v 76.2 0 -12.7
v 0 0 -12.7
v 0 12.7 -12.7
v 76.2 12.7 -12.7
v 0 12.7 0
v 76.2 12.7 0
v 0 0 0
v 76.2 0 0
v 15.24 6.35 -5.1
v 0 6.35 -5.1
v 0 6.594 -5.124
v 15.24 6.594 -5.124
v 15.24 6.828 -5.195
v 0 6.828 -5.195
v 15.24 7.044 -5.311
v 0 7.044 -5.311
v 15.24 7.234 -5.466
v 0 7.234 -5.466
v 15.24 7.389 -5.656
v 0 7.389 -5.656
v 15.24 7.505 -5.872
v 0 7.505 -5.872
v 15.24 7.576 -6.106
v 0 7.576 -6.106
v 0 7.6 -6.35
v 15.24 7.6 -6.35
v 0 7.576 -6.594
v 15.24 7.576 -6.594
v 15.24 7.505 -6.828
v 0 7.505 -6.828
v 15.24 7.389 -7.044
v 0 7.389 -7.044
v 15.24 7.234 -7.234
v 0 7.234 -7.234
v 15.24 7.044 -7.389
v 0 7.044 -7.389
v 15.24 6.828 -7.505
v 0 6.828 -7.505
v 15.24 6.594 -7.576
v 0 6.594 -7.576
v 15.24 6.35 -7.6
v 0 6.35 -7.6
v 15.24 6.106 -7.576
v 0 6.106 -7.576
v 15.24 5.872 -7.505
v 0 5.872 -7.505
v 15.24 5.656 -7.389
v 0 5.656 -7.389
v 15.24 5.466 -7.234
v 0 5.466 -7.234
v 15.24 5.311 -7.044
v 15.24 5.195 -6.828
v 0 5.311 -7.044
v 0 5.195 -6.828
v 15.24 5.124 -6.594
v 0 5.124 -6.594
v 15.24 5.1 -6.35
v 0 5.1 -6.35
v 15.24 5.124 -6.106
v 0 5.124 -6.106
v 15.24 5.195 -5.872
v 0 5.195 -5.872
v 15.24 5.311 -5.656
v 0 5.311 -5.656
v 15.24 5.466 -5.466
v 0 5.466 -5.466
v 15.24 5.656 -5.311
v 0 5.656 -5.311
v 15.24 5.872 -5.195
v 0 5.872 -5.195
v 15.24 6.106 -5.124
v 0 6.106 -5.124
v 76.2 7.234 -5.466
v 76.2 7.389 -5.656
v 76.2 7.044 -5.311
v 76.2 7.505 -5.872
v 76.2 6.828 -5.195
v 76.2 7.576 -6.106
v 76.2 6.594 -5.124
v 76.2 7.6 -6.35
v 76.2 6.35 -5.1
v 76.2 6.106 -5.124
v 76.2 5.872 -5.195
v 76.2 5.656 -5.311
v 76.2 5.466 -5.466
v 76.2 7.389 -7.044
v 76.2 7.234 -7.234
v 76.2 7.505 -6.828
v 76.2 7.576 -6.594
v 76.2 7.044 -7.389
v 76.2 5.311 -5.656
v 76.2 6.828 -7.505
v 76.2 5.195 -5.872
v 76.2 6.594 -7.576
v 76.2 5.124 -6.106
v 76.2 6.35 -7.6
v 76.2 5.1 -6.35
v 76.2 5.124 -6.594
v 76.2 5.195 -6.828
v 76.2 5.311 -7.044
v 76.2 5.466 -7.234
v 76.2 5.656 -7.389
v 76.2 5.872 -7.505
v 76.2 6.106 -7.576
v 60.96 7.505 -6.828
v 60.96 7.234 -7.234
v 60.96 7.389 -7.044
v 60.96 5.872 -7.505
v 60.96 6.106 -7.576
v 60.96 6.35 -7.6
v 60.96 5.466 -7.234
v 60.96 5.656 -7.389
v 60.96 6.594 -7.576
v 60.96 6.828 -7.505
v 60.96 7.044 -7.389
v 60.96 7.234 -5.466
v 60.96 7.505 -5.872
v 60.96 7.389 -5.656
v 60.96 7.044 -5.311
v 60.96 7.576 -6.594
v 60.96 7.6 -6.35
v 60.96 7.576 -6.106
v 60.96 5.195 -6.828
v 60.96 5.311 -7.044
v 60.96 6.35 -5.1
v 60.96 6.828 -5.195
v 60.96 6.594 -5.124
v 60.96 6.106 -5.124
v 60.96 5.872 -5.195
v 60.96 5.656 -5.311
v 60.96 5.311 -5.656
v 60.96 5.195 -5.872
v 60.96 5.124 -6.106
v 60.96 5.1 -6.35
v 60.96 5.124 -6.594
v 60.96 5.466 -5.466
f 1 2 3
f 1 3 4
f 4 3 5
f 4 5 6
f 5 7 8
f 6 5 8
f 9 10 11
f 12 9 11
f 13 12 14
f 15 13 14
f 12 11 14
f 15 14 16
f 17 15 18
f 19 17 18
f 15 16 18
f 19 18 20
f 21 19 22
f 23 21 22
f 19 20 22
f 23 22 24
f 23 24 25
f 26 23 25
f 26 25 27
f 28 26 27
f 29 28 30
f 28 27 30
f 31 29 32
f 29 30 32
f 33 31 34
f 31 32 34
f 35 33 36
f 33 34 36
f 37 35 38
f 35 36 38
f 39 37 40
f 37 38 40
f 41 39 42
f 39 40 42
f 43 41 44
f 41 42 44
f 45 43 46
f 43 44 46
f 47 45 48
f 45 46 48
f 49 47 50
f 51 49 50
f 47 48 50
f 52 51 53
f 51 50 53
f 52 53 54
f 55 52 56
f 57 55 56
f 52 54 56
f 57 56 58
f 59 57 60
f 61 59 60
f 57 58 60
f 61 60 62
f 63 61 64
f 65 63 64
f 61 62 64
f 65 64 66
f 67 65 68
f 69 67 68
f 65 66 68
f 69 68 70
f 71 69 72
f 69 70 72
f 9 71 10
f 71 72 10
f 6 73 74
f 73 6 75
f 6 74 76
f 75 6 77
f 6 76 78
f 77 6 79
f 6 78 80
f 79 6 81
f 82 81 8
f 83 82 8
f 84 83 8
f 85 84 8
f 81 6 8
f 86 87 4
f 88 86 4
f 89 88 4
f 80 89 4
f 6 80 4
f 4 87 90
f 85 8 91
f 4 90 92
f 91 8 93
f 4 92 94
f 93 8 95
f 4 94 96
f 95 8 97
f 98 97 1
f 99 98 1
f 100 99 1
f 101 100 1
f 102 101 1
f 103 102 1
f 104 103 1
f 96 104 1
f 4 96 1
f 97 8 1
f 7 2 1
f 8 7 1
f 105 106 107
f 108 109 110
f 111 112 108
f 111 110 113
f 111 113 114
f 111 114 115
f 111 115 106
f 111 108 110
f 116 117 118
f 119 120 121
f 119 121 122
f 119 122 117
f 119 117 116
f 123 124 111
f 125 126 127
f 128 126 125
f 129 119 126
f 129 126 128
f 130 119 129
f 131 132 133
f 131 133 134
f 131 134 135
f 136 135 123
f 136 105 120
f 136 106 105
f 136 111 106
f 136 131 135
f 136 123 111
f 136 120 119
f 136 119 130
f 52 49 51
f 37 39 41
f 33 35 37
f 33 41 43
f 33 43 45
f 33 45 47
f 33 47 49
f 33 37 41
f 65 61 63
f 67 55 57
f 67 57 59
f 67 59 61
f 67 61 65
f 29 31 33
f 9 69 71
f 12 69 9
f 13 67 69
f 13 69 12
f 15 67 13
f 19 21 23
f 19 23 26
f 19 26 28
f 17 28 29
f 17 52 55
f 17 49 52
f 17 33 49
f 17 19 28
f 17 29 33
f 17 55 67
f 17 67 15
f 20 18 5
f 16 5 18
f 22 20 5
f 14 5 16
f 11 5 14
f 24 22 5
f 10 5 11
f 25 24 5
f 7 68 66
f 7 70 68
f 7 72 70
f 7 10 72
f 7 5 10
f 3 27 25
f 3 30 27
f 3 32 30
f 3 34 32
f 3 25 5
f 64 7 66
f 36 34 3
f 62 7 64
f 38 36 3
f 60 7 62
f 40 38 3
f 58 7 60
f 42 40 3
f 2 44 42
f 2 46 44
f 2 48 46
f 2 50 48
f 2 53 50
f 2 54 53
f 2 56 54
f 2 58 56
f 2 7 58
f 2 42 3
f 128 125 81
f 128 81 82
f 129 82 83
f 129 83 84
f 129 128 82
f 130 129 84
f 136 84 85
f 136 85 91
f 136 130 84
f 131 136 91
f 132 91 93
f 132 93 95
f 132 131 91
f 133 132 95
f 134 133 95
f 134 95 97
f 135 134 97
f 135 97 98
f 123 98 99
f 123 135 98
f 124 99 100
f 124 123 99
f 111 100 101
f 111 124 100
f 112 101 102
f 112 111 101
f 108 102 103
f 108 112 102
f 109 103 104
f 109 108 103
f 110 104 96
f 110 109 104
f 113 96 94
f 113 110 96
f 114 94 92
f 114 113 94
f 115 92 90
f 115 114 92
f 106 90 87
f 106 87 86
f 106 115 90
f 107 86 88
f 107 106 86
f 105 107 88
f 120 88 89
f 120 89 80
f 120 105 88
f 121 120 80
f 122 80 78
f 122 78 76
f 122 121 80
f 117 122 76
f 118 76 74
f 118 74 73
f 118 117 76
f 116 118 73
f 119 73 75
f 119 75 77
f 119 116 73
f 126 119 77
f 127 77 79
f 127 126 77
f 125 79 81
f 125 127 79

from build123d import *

# Parameters (mm, degrees)
SKETCH1_W           = 76.2
SKETCH1_H           = 12.7
BOSS_EXTRUDE1_DEPTH = 12.7
SKETCH3_R           = 1.25
CUT_EXTRUDE1_DEPTH  = 15.24
CUT_EXTRUDE2_START  = -15.24
SKETCH2_R           = 1.25
CUT_EXTRUDE2_DEPTH  = 15.24


with BuildPart() as part:
    # Sketch1 → Boss-Extrude1 (new body)
    with BuildSketch(Plane(origin=(0, 0, 0), x_dir=(1, 0, 0), z_dir=(0, 1, 0))):
        with Locations((38.1, 6.35)):
            Rectangle(SKETCH1_W, SKETCH1_H)
    extrude(amount=BOSS_EXTRUDE1_DEPTH)

    # Sketch3 → Cut-Extrude1 (cut)
    with BuildSketch(Plane.ZY):
        with Locations((-6.35, 6.35)):
            Circle(SKETCH3_R)
    extrude(amount=-CUT_EXTRUDE1_DEPTH, mode=Mode.SUBTRACT)

    # Sketch2 → Cut-Extrude2 (cut)
    with BuildSketch(Plane(origin=(76.2, 0, 0), x_dir=(0, 0, -1), z_dir=(1, 0, 0)).offset(CUT_EXTRUDE2_START)):
        with Locations(Location((6.35, 6.35, 0), (0, 0, 180))):
            Circle(SKETCH2_R)
    extrude(amount=CUT_EXTRUDE2_DEPTH, mode=Mode.SUBTRACT)


solid = part.part
